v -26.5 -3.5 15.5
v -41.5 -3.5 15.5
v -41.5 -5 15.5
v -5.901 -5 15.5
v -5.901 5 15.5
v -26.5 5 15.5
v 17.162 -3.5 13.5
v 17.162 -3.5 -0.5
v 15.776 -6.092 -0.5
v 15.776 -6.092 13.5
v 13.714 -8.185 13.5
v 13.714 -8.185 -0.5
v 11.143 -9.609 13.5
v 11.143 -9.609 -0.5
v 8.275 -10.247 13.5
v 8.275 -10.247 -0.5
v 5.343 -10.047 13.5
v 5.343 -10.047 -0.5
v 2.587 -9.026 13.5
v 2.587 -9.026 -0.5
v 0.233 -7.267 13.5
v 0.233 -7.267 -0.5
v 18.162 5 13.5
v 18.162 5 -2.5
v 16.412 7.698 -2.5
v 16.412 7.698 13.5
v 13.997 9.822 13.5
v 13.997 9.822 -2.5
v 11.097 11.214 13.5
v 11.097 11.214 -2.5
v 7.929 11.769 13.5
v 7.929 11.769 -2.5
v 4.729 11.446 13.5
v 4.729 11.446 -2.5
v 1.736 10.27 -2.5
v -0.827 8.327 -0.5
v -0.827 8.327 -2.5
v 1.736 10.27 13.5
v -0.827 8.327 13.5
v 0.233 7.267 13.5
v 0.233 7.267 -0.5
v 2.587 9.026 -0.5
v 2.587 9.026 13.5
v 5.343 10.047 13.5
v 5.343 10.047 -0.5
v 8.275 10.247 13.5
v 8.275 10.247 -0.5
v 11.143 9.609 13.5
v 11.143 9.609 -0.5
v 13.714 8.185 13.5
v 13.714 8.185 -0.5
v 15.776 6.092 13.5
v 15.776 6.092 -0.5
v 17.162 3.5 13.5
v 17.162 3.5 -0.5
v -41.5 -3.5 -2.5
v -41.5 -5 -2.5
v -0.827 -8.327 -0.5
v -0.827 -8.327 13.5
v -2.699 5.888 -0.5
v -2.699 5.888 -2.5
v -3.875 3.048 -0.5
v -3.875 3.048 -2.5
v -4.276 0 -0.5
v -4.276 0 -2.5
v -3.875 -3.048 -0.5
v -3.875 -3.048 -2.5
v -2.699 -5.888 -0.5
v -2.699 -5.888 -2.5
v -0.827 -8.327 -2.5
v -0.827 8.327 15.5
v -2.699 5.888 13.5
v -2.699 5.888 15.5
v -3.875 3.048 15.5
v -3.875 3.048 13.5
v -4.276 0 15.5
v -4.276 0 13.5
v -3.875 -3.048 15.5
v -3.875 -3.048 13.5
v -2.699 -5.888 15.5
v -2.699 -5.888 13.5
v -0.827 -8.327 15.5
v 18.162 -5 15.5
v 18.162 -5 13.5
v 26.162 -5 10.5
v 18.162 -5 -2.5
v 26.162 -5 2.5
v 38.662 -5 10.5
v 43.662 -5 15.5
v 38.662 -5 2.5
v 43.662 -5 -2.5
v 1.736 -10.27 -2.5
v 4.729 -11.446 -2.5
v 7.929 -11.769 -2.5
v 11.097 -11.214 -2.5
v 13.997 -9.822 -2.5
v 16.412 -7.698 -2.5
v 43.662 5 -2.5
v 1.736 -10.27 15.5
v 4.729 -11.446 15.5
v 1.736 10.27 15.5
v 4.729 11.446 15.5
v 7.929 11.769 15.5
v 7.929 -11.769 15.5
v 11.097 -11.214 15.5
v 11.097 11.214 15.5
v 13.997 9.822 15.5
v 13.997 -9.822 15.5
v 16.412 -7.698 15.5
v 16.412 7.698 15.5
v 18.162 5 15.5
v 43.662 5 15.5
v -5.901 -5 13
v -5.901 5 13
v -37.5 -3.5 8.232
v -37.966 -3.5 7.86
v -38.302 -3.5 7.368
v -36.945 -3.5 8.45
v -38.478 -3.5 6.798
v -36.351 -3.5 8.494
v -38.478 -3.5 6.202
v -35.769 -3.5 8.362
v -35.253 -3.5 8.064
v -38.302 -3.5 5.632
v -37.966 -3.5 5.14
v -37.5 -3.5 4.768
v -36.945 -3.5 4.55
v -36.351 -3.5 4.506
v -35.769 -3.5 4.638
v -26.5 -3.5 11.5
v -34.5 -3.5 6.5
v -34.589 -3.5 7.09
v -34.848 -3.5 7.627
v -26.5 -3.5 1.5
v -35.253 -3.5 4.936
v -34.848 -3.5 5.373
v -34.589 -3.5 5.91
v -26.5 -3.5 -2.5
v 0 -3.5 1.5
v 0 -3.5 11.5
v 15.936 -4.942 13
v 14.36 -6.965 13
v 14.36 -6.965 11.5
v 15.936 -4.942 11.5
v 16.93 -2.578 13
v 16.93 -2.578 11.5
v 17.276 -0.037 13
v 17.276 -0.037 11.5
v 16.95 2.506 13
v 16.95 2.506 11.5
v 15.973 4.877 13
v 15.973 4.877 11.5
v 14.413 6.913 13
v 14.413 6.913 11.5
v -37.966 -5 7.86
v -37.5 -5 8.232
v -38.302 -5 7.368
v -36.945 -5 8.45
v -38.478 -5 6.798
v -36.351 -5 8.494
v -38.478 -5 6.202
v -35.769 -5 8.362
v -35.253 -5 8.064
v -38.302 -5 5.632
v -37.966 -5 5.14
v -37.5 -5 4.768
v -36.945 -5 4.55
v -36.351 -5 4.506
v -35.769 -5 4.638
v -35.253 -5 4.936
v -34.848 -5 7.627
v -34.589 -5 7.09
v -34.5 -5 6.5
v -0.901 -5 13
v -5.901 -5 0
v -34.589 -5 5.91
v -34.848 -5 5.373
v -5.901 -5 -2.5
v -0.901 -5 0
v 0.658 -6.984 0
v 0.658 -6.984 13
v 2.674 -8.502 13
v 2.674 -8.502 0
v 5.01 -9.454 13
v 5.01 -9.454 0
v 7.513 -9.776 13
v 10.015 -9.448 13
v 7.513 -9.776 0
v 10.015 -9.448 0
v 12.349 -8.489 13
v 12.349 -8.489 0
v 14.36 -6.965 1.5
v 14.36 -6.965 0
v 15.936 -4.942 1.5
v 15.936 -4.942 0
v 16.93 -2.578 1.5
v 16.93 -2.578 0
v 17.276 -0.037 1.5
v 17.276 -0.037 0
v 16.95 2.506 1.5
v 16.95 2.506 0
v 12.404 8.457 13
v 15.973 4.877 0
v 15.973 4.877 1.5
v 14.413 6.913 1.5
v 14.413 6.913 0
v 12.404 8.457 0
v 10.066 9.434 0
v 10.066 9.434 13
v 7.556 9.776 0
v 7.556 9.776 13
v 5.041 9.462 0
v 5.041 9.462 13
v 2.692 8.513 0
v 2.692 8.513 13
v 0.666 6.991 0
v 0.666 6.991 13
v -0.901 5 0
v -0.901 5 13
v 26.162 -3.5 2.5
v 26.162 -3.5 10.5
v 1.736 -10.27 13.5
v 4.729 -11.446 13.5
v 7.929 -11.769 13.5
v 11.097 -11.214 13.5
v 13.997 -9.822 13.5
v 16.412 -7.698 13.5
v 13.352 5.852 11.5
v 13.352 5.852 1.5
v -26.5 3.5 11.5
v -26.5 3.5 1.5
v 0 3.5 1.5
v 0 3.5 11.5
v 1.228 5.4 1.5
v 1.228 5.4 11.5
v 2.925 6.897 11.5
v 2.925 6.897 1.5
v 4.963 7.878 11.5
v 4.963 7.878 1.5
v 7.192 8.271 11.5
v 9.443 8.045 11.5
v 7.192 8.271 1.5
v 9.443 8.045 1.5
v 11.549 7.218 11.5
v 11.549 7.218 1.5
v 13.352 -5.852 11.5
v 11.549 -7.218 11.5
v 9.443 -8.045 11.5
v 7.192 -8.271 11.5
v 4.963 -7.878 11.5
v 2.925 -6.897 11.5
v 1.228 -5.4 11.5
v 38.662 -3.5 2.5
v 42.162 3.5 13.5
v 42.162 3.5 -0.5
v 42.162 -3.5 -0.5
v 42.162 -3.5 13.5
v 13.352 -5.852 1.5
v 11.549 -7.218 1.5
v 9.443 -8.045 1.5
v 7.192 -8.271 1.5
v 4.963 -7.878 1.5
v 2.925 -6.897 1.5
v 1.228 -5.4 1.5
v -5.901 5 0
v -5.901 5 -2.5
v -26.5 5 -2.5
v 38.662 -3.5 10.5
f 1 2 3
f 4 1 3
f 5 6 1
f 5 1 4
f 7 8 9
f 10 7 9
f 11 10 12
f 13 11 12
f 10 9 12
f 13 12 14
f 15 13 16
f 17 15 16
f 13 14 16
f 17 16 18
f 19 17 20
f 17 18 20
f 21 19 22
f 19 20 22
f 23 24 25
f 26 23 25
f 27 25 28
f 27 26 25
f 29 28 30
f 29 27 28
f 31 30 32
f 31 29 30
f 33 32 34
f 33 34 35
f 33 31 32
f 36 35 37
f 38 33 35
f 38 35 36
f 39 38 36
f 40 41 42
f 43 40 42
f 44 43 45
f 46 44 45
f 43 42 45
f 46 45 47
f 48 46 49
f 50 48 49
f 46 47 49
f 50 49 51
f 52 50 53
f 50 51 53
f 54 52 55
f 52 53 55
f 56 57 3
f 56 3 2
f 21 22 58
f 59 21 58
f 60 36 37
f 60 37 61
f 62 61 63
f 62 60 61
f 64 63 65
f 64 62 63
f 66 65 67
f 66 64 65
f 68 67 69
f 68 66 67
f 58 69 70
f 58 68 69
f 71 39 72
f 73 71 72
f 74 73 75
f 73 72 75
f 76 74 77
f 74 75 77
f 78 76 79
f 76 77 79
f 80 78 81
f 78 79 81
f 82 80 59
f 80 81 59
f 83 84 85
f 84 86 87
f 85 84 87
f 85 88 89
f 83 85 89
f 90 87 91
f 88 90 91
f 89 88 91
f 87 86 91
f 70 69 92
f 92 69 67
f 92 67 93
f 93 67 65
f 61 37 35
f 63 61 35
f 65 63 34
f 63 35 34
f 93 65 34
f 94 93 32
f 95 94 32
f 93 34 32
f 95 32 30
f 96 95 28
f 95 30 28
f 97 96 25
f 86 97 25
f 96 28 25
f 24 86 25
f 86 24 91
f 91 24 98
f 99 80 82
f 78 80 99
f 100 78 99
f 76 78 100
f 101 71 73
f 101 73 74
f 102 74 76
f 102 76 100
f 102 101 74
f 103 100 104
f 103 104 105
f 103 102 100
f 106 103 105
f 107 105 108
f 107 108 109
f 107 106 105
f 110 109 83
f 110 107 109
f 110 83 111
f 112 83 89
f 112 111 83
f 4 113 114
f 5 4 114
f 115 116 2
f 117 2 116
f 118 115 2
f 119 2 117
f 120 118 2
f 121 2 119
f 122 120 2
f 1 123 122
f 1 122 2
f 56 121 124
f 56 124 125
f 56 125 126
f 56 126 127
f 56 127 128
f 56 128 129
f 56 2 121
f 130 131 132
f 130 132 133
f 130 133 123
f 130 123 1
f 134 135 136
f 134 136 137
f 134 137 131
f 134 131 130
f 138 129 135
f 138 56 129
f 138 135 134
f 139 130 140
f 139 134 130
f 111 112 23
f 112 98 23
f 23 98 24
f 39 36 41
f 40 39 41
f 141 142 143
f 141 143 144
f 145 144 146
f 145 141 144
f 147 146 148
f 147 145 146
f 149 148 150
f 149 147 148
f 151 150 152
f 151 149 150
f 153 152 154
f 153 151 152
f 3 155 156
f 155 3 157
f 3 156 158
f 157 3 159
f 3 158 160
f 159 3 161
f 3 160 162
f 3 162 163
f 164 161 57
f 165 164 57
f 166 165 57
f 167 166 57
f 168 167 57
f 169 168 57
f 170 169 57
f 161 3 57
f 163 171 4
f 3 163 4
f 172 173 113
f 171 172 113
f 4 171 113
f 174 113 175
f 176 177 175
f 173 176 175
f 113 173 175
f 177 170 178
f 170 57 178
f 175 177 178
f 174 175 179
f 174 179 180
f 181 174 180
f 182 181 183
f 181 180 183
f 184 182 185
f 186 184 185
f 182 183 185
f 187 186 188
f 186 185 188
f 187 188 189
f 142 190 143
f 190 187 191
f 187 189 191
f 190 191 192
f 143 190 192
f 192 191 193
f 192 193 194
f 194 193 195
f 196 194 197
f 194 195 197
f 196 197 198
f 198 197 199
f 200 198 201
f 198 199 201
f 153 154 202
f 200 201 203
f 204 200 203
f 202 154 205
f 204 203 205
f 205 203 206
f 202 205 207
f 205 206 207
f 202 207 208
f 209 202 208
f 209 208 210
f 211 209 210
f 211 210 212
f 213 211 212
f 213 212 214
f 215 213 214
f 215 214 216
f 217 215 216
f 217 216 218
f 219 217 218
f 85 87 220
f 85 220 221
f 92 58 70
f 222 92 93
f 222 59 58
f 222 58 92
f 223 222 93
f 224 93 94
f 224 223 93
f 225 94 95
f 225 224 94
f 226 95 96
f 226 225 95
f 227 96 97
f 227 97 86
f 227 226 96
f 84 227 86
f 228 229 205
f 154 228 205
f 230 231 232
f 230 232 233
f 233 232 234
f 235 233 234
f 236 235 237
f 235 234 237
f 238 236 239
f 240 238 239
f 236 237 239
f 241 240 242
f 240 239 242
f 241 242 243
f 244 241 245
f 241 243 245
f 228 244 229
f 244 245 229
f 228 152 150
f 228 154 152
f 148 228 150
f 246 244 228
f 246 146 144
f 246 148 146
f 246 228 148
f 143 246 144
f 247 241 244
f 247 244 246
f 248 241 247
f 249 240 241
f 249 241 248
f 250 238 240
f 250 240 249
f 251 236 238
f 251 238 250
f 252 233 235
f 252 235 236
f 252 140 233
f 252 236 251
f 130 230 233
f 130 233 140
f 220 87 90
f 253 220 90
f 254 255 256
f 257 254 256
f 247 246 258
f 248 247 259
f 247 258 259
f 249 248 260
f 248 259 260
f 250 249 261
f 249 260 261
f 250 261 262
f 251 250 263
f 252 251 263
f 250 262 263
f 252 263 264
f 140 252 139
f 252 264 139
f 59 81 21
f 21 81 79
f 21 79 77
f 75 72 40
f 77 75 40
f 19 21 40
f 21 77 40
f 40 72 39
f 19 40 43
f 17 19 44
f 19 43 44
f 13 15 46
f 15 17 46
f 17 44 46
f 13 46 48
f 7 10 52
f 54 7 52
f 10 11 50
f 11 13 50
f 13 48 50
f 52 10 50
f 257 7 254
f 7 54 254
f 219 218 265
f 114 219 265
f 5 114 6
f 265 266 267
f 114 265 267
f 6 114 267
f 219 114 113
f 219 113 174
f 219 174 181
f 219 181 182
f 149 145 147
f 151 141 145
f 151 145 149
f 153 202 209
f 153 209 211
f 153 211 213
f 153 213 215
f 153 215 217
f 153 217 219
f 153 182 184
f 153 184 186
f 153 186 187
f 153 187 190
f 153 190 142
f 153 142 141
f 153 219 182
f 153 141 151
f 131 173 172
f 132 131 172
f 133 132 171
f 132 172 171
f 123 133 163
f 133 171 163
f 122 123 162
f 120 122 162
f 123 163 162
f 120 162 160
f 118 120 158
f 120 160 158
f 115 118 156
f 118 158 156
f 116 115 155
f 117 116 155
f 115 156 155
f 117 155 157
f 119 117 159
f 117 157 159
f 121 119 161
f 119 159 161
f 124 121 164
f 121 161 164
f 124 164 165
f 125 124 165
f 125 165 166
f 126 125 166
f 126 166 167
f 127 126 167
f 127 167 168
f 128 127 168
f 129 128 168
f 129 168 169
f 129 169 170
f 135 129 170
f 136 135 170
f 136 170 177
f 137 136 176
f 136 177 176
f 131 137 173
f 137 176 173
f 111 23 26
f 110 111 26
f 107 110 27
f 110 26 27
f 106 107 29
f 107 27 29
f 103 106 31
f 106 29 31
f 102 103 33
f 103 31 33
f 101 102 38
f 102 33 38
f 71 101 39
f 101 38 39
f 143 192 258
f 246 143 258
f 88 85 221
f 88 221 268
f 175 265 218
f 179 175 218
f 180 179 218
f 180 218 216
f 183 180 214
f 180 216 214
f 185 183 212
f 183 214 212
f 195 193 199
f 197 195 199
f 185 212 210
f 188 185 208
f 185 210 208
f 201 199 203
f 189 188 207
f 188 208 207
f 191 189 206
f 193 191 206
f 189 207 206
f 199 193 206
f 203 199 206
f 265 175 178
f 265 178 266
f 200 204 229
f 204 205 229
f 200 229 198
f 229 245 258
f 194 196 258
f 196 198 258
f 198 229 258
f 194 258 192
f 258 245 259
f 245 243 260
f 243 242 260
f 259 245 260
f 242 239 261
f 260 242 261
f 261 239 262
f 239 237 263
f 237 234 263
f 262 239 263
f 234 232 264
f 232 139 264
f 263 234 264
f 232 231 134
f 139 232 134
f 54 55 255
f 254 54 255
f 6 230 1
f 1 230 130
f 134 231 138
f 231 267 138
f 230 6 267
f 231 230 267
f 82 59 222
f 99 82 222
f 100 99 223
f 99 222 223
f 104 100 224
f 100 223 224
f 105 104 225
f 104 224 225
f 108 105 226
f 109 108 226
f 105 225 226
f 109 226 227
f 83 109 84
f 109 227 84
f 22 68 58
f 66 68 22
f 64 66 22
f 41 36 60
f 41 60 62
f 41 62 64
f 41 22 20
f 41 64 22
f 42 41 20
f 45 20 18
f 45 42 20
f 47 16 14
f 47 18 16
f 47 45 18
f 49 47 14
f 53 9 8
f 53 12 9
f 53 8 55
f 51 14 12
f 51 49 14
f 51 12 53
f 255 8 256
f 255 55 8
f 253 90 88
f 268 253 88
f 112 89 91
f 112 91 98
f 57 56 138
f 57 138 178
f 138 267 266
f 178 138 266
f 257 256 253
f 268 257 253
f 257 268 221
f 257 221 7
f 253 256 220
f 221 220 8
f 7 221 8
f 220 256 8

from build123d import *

# Parameters (mm, degrees)
F0_W      = 15
F0_H      = 1.5
F3_DEPTH  = 11.5
F0_W_2    = 19.098844244
F0_H_2    = 7
F0_W_3    = 5.901155756
F4_DEPTH  = 1.5
F7_DEPTH  = 1.5
F8_W      = 7
F8_H      = 10
F9_DEPTH  = 1.5
F10_DEPTH = 14
F11_DEPTH = 2
F14_DEPTH = 2
F15_R     = 2
F16_DEPTH = 1.5
F17_W     = 12.4997539157
F17_H     = 8
F18_DEPTH = 1.5
F19_DEPTH = 2.5
F6_W      = 15
F6_H      = 1.5
F20_DEPTH = 2.5


with BuildPart() as f3:
    # F0 (on Top) → F3 (new body)
    with BuildSketch(Plane.XY):
        Polygon((-25, -3.5), (-25, 3.5), (-5.901155756, 3.5), (-5.901155756, 5), (-26.5, 5), (-26.5, -3.5), (-26.5, -5), (-5.901155756, -5), (-5.901155756, -3.5), align=None)
        with BuildLine():
            Line((-5.901155756, 5), (-5.901155756, 3.5))
            Line((-5.901155756, 3.5), (0, 3.5))
            ThreePointArc((0, 3.5), (6.0640072265, 8.150946249), (13.3523499554, 5.8523499554))
            Line((13.3523499554, 5.8523499554), (14.4130101271, 6.9130101271))
            ThreePointArc((14.4130101271, 6.9130101271), (6.288164083, 9.7010758035), (-0.901155756, 5))
            Line((-0.901155756, 5), (-5.901155756, 5))
        make_face()
        with Locations((-34, -4.25)):
            Rectangle(F0_W, F0_H)
        with BuildLine():
            Line((0, -3.5), (-5.901155756, -3.5))
            Line((-5.901155756, -3.5), (-5.901155756, -5))
            Line((-5.901155756, -5), (-0.901155756, -5))
            ThreePointArc((-0.901155756, -5), (6.2512782538, -9.6963968584), (14.3602281761, -6.9653921216))
            Line((14.3602281761, -6.9653921216), (13.3523499554, -5.8523499554))
            ThreePointArc((13.3523499554, -5.8523499554), (6.0640072265, -8.150946249), (0, -3.5))
        make_face()
    extrude(amount=F3_DEPTH)

    # F3_face (on face) + F0 (on Top) → F4 (join)
    with BuildSketch(Plane(origin=(-10.9399146221, -0.5895055558, 11.5), x_dir=(1, 0, 0), z_dir=(0, 0, 1))):
        with BuildLine():
            Line((-15.5600853779, 5.5895055558), (-15.5600853779, -2.9104944442))
            Line((-15.5600853779, -2.9104944442), (-30.5600853779, -2.9104944442))
            Line((-30.5600853779, -2.9104944442), (-30.5600853779, -4.4104944442))
            Line((-30.5600853779, -4.4104944442), (10.0387588661, -4.4104944442))
            ThreePointArc((10.0387588661, -4.4104944442), (17.1911928759, -9.1068913026), (25.3001427982, -6.3758865658))
            Line((25.3001427982, -6.3758865658), (24.2922645775, -5.2628443995))
            ThreePointArc((24.2922645775, -5.2628443995), (17.0039218486, -7.5614406932), (10.9399146221, -2.9104944442))
            Line((10.9399146221, -2.9104944442), (-14.0600853779, -2.9104944442))
            Line((-14.0600853779, -2.9104944442), (-14.0600853779, 4.0895055558))
            Line((-14.0600853779, 4.0895055558), (10.9399146221, 4.0895055558))
            ThreePointArc((10.9399146221, 4.0895055558), (17.0039218486, 8.7404518048), (24.2922645775, 6.4418555112))
            Line((24.2922645775, 6.4418555112), (25.3529247492, 7.502515683))
            ThreePointArc((25.3529247492, 7.502515683), (17.2280787051, 10.2905813594), (10.0387588661, 5.5895055558))
            Line((10.0387588661, 5.5895055558), (-15.5600853779, 5.5895055558))
        make_face()
    with BuildSketch(Plane.XY):
        Polygon((-25, -3.5), (-25, 3.5), (-5.901155756, 3.5), (-5.901155756, 5), (-26.5, 5), (-26.5, -3.5), (-26.5, -5), (-5.901155756, -5), (-5.901155756, -3.5), align=None)
        with BuildLine():
            Line((0, -3.5), (-5.901155756, -3.5))
            Line((-5.901155756, -3.5), (-5.901155756, -5))
            Line((-5.901155756, -5), (-0.901155756, -5))
            ThreePointArc((-0.901155756, -5), (6.2512782538, -9.6963968584), (14.3602281761, -6.9653921216))
            Line((14.3602281761, -6.9653921216), (13.3523499554, -5.8523499554))
            ThreePointArc((13.3523499554, -5.8523499554), (6.0640072265, -8.150946249), (0, -3.5))
        make_face()
        with BuildLine():
            ThreePointArc((13.3523499554, 5.8523499554), (6.0640072265, 8.150946249), (0, 3.5))
            Line((0, 3.5), (0, -3.5))
            ThreePointArc((0, -3.5), (6.0640072265, -8.150946249), (13.3523499554, -5.8523499554))
            Line((13.3523499554, -5.8523499554), (7.5, 0))
            Line((7.5, 0), (13.3523499554, 5.8523499554))
        make_face()
        with BuildLine():
            Line((14.4130101271, 6.9130101271), (13.3523499554, 5.8523499554))
            Line((13.3523499554, 5.8523499554), (7.5, 0))
            Line((7.5, 0), (13.3523499554, -5.8523499554))
            Line((13.3523499554, -5.8523499554), (14.3602281761, -6.9653921216))
            ThreePointArc((14.3602281761, -6.9653921216), (17.2764019754, -0.0371813384), (14.4130101271, 6.9130101271))
        make_face()
        with Locations((-15.450577878, 0)):
            Rectangle(F0_W_2, F0_H_2)
        with Locations((-2.950577878, 0)):
            Rectangle(F0_W_3, F0_H_2)
    extrude(amount=F4_DEPTH)

    # F6 (on offset) → F7 (join)
    with BuildSketch(Plane.XY.offset(13)):
        Polygon((-26.5, -3.5), (-26.5, -5), (-5.901155756, -5), (-5.901155756, 5), (-26.5, 5), align=None)
        with BuildLine():
            Line((-5.901155756, 5), (-5.901155756, -5))
            Line((-5.901155756, -5), (-0.901155756, -5))
            ThreePointArc((-0.901155756, -5), (6.2512782538, -9.6963968584), (14.3602281761, -6.9653921216))
            ThreePointArc((14.3602281761, -6.9653921216), (17.2764019754, -0.0371813384), (14.4130101271, 6.9130101271))
            ThreePointArc((14.4130101271, 6.9130101271), (6.288164083, 9.7010758035), (-0.901155756, 5))
            Line((-0.901155756, 5), (-5.901155756, 5))
        make_face()
    extrude(amount=-F7_DEPTH)

    # F8 (on face) → F9 (cut, through all)
    with BuildSketch(Plane(origin=(-26.5, 0, 0), x_dir=(0, -1, 0), z_dir=(-1, 0, 0))):
        with Locations((0, 6.5)):
            Rectangle(F8_W, F8_H)
    extrude(amount=-F9_DEPTH, mode=Mode.SUBTRACT)

    # F15 (on face) → F16 (cut, through all)
    with BuildSketch(Plane.XZ.offset(5)):
        with Locations((-36.5, 6.5)):
            Circle(F15_R)
    extrude(amount=-F16_DEPTH, mode=Mode.SUBTRACT)

    # F0 (on Top) → F19 (join)
    with BuildSketch(Plane.XY):
        Polygon((-25, -3.5), (-25, 3.5), (-5.901155756, 3.5), (-5.901155756, 5), (-26.5, 5), (-26.5, -3.5), (-26.5, -5), (-5.901155756, -5), (-5.901155756, -3.5), align=None)
        with Locations((-15.450577878, 0)):
            Rectangle(F0_W_2, F0_H_2)
        with Locations((-34, -4.25)):
            Rectangle(F0_W, F0_H)
    extrude(amount=-F19_DEPTH)

    # F6 (on offset) → F20 (join)
    with BuildSketch(Plane.XY.offset(13)):
        Polygon((-26.5, -3.5), (-26.5, -5), (-5.901155756, -5), (-5.901155756, 5), (-26.5, 5), align=None)
        with Locations((-34, -4.25)):
            Rectangle(F6_W, F6_H)
    extrude(amount=F20_DEPTH)


with BuildPart() as f10:
    # F2 (on offset) → F10 (new body)
    with BuildSketch(Plane.XY.offset(-0.5)):
        with BuildLine():
            ThreePointArc((0.2334364823, 7.2665635177), (9.731900812, 10.0311768741), (17.1620852157, 3.5))
            Line((17.1620852157, 3.5), (42.1620852157, 3.5))
            Line((42.1620852157, 3.5), (42.1620852157, -3.5))
            Line((42.1620852157, -3.5), (17.1620852157, -3.5))
            ThreePointArc((17.1620852157, -3.5), (9.731900812, -10.0311768741), (0.2334364823, -7.2665635177))
            Line((0.2334364823, -7.2665635177), (-0.8272236895, -8.3272236895))
            ThreePointArc((-0.8272236895, -8.3272236895), (9.5324335802, -11.5997638981), (18.1623313, -5))
            Line((18.1623313, -5), (43.6620852157, -5))
            Line((43.6620852157, -5), (43.6620852157, 5))
            Line((43.6620852157, 5), (18.1623313, 5))
            ThreePointArc((18.1623313, 5), (9.5324335802, 11.5997638981), (-0.8272236895, 8.3272236895))
            Line((-0.8272236895, 8.3272236895), (0.2334364823, 7.2665635177))
        make_face()
    extrude(amount=F10_DEPTH)

    # F2 (on offset) → F11 (join)
    with BuildSketch(Plane.XY.offset(-0.5)):
        with BuildLine():
            ThreePointArc((0.2334364823, 7.2665635177), (9.731900812, 10.0311768741), (17.1620852157, 3.5))
            Line((17.1620852157, 3.5), (42.1620852157, 3.5))
            Line((42.1620852157, 3.5), (42.1620852157, -3.5))
            Line((42.1620852157, -3.5), (17.1620852157, -3.5))
            ThreePointArc((17.1620852157, -3.5), (9.731900812, -10.0311768741), (0.2334364823, -7.2665635177))
            Line((0.2334364823, -7.2665635177), (-0.8272236895, -8.3272236895))
            ThreePointArc((-0.8272236895, -8.3272236895), (9.5324335802, -11.5997638981), (18.1623313, -5))
            Line((18.1623313, -5), (43.6620852157, -5))
            Line((43.6620852157, -5), (43.6620852157, 5))
            Line((43.6620852157, 5), (18.1623313, 5))
            ThreePointArc((18.1623313, 5), (9.5324335802, 11.5997638981), (-0.8272236895, 8.3272236895))
            Line((-0.8272236895, 8.3272236895), (0.2334364823, 7.2665635177))
        make_face()
        with BuildLine():
            Line((42.1620852157, 3.5), (17.1620852157, 3.5))
            ThreePointArc((17.1620852157, 3.5), (9.731900812, 10.0311768741), (0.2334364823, 7.2665635177))
            Line((0.2334364823, 7.2665635177), (0.5869898729, 6.9130101271))
            Line((0.5869898729, 6.9130101271), (7.5, 0))
            Line((7.5, 0), (0.2334364823, -7.2665635177))
            ThreePointArc((0.2334364823, -7.2665635177), (9.731900812, -10.0311768741), (17.1620852157, -3.5))
            Line((17.1620852157, -3.5), (42.1620852157, -3.5))
            Line((42.1620852157, -3.5), (42.1620852157, 3.5))
        make_face()
        with BuildLine():
            Line((0.5869898729, 6.9130101271), (0.2334364823, 7.2665635177))
            Line((0.2334364823, 7.2665635177), (-0.8272236895, 8.3272236895))
            ThreePointArc((-0.8272236895, 8.3272236895), (-4.2764726786, 0), (-0.8272236895, -8.3272236895))
            Line((-0.8272236895, -8.3272236895), (0.2334364823, -7.2665635177))
            Line((0.2334364823, -7.2665635177), (7.5, 0))
            Line((7.5, 0), (0.5869898729, 6.9130101271))
        make_face()
    extrude(amount=-F11_DEPTH)

    # F13 (on offset) → F14 (join)
    with BuildSketch(Plane.XY.offset(13.5)):
        with BuildLine():
            Line((43.6620852157, -5), (43.6620852157, 5))
            Line((43.6620852157, 5), (18.1623313, 5))
            ThreePointArc((18.1623313, 5), (9.5324335802, 11.5997638981), (-0.8272236895, 8.3272236895))
            ThreePointArc((-0.8272236895, 8.3272236895), (-4.2764726786, 0), (-0.8272236895, -8.3272236895))
            ThreePointArc((-0.8272236895, -8.3272236895), (9.5324335802, -11.5997638981), (18.1623313, -5))
            Line((18.1623313, -5), (43.6620852157, -5))
        make_face()
    extrude(amount=F14_DEPTH)

    # F17 (on face) → F18 (cut, through all)
    with BuildSketch(Plane.XZ.offset(5)):
        with Locations((32.4122082578, 6.5)):
            Rectangle(F17_W, F17_H)
    extrude(amount=-F18_DEPTH, mode=Mode.SUBTRACT)


solid = Compound([f3.part, f10.part])
